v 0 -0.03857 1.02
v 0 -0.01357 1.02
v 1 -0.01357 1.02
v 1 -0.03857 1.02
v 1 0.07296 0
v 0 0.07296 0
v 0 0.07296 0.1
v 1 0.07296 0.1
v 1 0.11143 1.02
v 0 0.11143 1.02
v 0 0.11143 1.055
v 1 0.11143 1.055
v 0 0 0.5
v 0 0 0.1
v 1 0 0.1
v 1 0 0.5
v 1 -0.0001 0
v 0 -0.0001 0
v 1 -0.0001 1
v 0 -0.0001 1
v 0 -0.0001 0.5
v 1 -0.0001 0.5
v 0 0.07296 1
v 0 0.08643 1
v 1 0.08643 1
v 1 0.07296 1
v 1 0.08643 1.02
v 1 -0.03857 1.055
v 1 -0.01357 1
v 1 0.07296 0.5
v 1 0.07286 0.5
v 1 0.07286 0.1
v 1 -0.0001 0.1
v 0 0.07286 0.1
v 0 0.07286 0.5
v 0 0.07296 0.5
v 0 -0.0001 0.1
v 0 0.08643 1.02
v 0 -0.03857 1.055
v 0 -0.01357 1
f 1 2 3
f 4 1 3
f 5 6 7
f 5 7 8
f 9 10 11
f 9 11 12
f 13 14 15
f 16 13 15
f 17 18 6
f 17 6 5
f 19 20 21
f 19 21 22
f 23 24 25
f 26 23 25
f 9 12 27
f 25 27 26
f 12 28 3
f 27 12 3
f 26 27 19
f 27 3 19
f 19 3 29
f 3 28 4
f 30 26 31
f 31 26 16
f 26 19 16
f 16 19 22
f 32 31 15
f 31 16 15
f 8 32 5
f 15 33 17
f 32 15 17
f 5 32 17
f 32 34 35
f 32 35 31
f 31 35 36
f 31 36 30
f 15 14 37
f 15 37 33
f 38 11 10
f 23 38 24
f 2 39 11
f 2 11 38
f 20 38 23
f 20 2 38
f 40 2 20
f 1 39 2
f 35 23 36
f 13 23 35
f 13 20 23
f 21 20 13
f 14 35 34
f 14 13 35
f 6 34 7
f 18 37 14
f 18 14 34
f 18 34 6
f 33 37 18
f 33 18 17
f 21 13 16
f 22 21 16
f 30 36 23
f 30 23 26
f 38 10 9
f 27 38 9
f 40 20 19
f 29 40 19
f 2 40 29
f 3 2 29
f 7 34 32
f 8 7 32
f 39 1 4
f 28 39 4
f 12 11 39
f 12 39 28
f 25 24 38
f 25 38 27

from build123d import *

# Parameters (mm, degrees)
SKETCH1_W           = 1
SKETCH1_H           = 0.072865
BOSS_EXTRUDE1_DEPTH = 1
SKETCH2_W           = 1
SKETCH2_H           = 0.1
BOSS_EXTRUDE2_DEPTH = 0.02
SKETCH3_W           = 1
SKETCH3_H           = 0.15
BOSS_EXTRUDE3_DEPTH = 0.035
SKETCH4_W           = 1
SKETCH4_H           = 0.1
SKETCH4_H_2         = 0.5
BOSS_EXTRUDE4_DEPTH = 0.0001
SKETCH6_W           = 1
SKETCH6_H           = 0.1
SKETCH6_H_2         = 0.5
BOSS_EXTRUDE5_DEPTH = 0.0001


with BuildPart() as part:
    # Sketch1 → Boss-Extrude1 (new body)
    with BuildSketch(Plane.XY):
        with Locations((0.5, 0.0364325)):
            Rectangle(SKETCH1_W, SKETCH1_H)
    extrude(amount=BOSS_EXTRUDE1_DEPTH)

    # Sketch2 → Boss-Extrude2 (add)
    with BuildSketch(Plane.XY.offset(1)):
        with Locations((0.5, 0.0364325)):
            Rectangle(SKETCH2_W, SKETCH2_H)
    extrude(amount=BOSS_EXTRUDE2_DEPTH)

    # Sketch3 → Boss-Extrude3 (add)
    with BuildSketch(Plane.XY.offset(1.02)):
        with Locations((0.5, 0.0364325)):
            Rectangle(SKETCH3_W, SKETCH3_H)
    extrude(amount=BOSS_EXTRUDE3_DEPTH)

    # Sketch4 → Boss-Extrude4 (add)
    with BuildSketch(Plane.XZ):
        with Locations((0.5, 0.05)):
            Rectangle(SKETCH4_W, SKETCH4_H)
        with Locations((0.5, 0.75)):
            Rectangle(SKETCH4_W, SKETCH4_H_2)
    extrude(amount=BOSS_EXTRUDE4_DEPTH)

    # Sketch6 → Boss-Extrude5 (add)
    with BuildSketch(Plane(origin=(0, 0.072865, 0), x_dir=(1, 0, 0), z_dir=(0, 1, 0))):
        with Locations((0.5, -0.05)):
            Rectangle(SKETCH6_W, SKETCH6_H)
        with Locations((0.5, -0.75)):
            Rectangle(SKETCH6_W, SKETCH6_H_2)
    extrude(amount=BOSS_EXTRUDE5_DEPTH)


solid = part.part
